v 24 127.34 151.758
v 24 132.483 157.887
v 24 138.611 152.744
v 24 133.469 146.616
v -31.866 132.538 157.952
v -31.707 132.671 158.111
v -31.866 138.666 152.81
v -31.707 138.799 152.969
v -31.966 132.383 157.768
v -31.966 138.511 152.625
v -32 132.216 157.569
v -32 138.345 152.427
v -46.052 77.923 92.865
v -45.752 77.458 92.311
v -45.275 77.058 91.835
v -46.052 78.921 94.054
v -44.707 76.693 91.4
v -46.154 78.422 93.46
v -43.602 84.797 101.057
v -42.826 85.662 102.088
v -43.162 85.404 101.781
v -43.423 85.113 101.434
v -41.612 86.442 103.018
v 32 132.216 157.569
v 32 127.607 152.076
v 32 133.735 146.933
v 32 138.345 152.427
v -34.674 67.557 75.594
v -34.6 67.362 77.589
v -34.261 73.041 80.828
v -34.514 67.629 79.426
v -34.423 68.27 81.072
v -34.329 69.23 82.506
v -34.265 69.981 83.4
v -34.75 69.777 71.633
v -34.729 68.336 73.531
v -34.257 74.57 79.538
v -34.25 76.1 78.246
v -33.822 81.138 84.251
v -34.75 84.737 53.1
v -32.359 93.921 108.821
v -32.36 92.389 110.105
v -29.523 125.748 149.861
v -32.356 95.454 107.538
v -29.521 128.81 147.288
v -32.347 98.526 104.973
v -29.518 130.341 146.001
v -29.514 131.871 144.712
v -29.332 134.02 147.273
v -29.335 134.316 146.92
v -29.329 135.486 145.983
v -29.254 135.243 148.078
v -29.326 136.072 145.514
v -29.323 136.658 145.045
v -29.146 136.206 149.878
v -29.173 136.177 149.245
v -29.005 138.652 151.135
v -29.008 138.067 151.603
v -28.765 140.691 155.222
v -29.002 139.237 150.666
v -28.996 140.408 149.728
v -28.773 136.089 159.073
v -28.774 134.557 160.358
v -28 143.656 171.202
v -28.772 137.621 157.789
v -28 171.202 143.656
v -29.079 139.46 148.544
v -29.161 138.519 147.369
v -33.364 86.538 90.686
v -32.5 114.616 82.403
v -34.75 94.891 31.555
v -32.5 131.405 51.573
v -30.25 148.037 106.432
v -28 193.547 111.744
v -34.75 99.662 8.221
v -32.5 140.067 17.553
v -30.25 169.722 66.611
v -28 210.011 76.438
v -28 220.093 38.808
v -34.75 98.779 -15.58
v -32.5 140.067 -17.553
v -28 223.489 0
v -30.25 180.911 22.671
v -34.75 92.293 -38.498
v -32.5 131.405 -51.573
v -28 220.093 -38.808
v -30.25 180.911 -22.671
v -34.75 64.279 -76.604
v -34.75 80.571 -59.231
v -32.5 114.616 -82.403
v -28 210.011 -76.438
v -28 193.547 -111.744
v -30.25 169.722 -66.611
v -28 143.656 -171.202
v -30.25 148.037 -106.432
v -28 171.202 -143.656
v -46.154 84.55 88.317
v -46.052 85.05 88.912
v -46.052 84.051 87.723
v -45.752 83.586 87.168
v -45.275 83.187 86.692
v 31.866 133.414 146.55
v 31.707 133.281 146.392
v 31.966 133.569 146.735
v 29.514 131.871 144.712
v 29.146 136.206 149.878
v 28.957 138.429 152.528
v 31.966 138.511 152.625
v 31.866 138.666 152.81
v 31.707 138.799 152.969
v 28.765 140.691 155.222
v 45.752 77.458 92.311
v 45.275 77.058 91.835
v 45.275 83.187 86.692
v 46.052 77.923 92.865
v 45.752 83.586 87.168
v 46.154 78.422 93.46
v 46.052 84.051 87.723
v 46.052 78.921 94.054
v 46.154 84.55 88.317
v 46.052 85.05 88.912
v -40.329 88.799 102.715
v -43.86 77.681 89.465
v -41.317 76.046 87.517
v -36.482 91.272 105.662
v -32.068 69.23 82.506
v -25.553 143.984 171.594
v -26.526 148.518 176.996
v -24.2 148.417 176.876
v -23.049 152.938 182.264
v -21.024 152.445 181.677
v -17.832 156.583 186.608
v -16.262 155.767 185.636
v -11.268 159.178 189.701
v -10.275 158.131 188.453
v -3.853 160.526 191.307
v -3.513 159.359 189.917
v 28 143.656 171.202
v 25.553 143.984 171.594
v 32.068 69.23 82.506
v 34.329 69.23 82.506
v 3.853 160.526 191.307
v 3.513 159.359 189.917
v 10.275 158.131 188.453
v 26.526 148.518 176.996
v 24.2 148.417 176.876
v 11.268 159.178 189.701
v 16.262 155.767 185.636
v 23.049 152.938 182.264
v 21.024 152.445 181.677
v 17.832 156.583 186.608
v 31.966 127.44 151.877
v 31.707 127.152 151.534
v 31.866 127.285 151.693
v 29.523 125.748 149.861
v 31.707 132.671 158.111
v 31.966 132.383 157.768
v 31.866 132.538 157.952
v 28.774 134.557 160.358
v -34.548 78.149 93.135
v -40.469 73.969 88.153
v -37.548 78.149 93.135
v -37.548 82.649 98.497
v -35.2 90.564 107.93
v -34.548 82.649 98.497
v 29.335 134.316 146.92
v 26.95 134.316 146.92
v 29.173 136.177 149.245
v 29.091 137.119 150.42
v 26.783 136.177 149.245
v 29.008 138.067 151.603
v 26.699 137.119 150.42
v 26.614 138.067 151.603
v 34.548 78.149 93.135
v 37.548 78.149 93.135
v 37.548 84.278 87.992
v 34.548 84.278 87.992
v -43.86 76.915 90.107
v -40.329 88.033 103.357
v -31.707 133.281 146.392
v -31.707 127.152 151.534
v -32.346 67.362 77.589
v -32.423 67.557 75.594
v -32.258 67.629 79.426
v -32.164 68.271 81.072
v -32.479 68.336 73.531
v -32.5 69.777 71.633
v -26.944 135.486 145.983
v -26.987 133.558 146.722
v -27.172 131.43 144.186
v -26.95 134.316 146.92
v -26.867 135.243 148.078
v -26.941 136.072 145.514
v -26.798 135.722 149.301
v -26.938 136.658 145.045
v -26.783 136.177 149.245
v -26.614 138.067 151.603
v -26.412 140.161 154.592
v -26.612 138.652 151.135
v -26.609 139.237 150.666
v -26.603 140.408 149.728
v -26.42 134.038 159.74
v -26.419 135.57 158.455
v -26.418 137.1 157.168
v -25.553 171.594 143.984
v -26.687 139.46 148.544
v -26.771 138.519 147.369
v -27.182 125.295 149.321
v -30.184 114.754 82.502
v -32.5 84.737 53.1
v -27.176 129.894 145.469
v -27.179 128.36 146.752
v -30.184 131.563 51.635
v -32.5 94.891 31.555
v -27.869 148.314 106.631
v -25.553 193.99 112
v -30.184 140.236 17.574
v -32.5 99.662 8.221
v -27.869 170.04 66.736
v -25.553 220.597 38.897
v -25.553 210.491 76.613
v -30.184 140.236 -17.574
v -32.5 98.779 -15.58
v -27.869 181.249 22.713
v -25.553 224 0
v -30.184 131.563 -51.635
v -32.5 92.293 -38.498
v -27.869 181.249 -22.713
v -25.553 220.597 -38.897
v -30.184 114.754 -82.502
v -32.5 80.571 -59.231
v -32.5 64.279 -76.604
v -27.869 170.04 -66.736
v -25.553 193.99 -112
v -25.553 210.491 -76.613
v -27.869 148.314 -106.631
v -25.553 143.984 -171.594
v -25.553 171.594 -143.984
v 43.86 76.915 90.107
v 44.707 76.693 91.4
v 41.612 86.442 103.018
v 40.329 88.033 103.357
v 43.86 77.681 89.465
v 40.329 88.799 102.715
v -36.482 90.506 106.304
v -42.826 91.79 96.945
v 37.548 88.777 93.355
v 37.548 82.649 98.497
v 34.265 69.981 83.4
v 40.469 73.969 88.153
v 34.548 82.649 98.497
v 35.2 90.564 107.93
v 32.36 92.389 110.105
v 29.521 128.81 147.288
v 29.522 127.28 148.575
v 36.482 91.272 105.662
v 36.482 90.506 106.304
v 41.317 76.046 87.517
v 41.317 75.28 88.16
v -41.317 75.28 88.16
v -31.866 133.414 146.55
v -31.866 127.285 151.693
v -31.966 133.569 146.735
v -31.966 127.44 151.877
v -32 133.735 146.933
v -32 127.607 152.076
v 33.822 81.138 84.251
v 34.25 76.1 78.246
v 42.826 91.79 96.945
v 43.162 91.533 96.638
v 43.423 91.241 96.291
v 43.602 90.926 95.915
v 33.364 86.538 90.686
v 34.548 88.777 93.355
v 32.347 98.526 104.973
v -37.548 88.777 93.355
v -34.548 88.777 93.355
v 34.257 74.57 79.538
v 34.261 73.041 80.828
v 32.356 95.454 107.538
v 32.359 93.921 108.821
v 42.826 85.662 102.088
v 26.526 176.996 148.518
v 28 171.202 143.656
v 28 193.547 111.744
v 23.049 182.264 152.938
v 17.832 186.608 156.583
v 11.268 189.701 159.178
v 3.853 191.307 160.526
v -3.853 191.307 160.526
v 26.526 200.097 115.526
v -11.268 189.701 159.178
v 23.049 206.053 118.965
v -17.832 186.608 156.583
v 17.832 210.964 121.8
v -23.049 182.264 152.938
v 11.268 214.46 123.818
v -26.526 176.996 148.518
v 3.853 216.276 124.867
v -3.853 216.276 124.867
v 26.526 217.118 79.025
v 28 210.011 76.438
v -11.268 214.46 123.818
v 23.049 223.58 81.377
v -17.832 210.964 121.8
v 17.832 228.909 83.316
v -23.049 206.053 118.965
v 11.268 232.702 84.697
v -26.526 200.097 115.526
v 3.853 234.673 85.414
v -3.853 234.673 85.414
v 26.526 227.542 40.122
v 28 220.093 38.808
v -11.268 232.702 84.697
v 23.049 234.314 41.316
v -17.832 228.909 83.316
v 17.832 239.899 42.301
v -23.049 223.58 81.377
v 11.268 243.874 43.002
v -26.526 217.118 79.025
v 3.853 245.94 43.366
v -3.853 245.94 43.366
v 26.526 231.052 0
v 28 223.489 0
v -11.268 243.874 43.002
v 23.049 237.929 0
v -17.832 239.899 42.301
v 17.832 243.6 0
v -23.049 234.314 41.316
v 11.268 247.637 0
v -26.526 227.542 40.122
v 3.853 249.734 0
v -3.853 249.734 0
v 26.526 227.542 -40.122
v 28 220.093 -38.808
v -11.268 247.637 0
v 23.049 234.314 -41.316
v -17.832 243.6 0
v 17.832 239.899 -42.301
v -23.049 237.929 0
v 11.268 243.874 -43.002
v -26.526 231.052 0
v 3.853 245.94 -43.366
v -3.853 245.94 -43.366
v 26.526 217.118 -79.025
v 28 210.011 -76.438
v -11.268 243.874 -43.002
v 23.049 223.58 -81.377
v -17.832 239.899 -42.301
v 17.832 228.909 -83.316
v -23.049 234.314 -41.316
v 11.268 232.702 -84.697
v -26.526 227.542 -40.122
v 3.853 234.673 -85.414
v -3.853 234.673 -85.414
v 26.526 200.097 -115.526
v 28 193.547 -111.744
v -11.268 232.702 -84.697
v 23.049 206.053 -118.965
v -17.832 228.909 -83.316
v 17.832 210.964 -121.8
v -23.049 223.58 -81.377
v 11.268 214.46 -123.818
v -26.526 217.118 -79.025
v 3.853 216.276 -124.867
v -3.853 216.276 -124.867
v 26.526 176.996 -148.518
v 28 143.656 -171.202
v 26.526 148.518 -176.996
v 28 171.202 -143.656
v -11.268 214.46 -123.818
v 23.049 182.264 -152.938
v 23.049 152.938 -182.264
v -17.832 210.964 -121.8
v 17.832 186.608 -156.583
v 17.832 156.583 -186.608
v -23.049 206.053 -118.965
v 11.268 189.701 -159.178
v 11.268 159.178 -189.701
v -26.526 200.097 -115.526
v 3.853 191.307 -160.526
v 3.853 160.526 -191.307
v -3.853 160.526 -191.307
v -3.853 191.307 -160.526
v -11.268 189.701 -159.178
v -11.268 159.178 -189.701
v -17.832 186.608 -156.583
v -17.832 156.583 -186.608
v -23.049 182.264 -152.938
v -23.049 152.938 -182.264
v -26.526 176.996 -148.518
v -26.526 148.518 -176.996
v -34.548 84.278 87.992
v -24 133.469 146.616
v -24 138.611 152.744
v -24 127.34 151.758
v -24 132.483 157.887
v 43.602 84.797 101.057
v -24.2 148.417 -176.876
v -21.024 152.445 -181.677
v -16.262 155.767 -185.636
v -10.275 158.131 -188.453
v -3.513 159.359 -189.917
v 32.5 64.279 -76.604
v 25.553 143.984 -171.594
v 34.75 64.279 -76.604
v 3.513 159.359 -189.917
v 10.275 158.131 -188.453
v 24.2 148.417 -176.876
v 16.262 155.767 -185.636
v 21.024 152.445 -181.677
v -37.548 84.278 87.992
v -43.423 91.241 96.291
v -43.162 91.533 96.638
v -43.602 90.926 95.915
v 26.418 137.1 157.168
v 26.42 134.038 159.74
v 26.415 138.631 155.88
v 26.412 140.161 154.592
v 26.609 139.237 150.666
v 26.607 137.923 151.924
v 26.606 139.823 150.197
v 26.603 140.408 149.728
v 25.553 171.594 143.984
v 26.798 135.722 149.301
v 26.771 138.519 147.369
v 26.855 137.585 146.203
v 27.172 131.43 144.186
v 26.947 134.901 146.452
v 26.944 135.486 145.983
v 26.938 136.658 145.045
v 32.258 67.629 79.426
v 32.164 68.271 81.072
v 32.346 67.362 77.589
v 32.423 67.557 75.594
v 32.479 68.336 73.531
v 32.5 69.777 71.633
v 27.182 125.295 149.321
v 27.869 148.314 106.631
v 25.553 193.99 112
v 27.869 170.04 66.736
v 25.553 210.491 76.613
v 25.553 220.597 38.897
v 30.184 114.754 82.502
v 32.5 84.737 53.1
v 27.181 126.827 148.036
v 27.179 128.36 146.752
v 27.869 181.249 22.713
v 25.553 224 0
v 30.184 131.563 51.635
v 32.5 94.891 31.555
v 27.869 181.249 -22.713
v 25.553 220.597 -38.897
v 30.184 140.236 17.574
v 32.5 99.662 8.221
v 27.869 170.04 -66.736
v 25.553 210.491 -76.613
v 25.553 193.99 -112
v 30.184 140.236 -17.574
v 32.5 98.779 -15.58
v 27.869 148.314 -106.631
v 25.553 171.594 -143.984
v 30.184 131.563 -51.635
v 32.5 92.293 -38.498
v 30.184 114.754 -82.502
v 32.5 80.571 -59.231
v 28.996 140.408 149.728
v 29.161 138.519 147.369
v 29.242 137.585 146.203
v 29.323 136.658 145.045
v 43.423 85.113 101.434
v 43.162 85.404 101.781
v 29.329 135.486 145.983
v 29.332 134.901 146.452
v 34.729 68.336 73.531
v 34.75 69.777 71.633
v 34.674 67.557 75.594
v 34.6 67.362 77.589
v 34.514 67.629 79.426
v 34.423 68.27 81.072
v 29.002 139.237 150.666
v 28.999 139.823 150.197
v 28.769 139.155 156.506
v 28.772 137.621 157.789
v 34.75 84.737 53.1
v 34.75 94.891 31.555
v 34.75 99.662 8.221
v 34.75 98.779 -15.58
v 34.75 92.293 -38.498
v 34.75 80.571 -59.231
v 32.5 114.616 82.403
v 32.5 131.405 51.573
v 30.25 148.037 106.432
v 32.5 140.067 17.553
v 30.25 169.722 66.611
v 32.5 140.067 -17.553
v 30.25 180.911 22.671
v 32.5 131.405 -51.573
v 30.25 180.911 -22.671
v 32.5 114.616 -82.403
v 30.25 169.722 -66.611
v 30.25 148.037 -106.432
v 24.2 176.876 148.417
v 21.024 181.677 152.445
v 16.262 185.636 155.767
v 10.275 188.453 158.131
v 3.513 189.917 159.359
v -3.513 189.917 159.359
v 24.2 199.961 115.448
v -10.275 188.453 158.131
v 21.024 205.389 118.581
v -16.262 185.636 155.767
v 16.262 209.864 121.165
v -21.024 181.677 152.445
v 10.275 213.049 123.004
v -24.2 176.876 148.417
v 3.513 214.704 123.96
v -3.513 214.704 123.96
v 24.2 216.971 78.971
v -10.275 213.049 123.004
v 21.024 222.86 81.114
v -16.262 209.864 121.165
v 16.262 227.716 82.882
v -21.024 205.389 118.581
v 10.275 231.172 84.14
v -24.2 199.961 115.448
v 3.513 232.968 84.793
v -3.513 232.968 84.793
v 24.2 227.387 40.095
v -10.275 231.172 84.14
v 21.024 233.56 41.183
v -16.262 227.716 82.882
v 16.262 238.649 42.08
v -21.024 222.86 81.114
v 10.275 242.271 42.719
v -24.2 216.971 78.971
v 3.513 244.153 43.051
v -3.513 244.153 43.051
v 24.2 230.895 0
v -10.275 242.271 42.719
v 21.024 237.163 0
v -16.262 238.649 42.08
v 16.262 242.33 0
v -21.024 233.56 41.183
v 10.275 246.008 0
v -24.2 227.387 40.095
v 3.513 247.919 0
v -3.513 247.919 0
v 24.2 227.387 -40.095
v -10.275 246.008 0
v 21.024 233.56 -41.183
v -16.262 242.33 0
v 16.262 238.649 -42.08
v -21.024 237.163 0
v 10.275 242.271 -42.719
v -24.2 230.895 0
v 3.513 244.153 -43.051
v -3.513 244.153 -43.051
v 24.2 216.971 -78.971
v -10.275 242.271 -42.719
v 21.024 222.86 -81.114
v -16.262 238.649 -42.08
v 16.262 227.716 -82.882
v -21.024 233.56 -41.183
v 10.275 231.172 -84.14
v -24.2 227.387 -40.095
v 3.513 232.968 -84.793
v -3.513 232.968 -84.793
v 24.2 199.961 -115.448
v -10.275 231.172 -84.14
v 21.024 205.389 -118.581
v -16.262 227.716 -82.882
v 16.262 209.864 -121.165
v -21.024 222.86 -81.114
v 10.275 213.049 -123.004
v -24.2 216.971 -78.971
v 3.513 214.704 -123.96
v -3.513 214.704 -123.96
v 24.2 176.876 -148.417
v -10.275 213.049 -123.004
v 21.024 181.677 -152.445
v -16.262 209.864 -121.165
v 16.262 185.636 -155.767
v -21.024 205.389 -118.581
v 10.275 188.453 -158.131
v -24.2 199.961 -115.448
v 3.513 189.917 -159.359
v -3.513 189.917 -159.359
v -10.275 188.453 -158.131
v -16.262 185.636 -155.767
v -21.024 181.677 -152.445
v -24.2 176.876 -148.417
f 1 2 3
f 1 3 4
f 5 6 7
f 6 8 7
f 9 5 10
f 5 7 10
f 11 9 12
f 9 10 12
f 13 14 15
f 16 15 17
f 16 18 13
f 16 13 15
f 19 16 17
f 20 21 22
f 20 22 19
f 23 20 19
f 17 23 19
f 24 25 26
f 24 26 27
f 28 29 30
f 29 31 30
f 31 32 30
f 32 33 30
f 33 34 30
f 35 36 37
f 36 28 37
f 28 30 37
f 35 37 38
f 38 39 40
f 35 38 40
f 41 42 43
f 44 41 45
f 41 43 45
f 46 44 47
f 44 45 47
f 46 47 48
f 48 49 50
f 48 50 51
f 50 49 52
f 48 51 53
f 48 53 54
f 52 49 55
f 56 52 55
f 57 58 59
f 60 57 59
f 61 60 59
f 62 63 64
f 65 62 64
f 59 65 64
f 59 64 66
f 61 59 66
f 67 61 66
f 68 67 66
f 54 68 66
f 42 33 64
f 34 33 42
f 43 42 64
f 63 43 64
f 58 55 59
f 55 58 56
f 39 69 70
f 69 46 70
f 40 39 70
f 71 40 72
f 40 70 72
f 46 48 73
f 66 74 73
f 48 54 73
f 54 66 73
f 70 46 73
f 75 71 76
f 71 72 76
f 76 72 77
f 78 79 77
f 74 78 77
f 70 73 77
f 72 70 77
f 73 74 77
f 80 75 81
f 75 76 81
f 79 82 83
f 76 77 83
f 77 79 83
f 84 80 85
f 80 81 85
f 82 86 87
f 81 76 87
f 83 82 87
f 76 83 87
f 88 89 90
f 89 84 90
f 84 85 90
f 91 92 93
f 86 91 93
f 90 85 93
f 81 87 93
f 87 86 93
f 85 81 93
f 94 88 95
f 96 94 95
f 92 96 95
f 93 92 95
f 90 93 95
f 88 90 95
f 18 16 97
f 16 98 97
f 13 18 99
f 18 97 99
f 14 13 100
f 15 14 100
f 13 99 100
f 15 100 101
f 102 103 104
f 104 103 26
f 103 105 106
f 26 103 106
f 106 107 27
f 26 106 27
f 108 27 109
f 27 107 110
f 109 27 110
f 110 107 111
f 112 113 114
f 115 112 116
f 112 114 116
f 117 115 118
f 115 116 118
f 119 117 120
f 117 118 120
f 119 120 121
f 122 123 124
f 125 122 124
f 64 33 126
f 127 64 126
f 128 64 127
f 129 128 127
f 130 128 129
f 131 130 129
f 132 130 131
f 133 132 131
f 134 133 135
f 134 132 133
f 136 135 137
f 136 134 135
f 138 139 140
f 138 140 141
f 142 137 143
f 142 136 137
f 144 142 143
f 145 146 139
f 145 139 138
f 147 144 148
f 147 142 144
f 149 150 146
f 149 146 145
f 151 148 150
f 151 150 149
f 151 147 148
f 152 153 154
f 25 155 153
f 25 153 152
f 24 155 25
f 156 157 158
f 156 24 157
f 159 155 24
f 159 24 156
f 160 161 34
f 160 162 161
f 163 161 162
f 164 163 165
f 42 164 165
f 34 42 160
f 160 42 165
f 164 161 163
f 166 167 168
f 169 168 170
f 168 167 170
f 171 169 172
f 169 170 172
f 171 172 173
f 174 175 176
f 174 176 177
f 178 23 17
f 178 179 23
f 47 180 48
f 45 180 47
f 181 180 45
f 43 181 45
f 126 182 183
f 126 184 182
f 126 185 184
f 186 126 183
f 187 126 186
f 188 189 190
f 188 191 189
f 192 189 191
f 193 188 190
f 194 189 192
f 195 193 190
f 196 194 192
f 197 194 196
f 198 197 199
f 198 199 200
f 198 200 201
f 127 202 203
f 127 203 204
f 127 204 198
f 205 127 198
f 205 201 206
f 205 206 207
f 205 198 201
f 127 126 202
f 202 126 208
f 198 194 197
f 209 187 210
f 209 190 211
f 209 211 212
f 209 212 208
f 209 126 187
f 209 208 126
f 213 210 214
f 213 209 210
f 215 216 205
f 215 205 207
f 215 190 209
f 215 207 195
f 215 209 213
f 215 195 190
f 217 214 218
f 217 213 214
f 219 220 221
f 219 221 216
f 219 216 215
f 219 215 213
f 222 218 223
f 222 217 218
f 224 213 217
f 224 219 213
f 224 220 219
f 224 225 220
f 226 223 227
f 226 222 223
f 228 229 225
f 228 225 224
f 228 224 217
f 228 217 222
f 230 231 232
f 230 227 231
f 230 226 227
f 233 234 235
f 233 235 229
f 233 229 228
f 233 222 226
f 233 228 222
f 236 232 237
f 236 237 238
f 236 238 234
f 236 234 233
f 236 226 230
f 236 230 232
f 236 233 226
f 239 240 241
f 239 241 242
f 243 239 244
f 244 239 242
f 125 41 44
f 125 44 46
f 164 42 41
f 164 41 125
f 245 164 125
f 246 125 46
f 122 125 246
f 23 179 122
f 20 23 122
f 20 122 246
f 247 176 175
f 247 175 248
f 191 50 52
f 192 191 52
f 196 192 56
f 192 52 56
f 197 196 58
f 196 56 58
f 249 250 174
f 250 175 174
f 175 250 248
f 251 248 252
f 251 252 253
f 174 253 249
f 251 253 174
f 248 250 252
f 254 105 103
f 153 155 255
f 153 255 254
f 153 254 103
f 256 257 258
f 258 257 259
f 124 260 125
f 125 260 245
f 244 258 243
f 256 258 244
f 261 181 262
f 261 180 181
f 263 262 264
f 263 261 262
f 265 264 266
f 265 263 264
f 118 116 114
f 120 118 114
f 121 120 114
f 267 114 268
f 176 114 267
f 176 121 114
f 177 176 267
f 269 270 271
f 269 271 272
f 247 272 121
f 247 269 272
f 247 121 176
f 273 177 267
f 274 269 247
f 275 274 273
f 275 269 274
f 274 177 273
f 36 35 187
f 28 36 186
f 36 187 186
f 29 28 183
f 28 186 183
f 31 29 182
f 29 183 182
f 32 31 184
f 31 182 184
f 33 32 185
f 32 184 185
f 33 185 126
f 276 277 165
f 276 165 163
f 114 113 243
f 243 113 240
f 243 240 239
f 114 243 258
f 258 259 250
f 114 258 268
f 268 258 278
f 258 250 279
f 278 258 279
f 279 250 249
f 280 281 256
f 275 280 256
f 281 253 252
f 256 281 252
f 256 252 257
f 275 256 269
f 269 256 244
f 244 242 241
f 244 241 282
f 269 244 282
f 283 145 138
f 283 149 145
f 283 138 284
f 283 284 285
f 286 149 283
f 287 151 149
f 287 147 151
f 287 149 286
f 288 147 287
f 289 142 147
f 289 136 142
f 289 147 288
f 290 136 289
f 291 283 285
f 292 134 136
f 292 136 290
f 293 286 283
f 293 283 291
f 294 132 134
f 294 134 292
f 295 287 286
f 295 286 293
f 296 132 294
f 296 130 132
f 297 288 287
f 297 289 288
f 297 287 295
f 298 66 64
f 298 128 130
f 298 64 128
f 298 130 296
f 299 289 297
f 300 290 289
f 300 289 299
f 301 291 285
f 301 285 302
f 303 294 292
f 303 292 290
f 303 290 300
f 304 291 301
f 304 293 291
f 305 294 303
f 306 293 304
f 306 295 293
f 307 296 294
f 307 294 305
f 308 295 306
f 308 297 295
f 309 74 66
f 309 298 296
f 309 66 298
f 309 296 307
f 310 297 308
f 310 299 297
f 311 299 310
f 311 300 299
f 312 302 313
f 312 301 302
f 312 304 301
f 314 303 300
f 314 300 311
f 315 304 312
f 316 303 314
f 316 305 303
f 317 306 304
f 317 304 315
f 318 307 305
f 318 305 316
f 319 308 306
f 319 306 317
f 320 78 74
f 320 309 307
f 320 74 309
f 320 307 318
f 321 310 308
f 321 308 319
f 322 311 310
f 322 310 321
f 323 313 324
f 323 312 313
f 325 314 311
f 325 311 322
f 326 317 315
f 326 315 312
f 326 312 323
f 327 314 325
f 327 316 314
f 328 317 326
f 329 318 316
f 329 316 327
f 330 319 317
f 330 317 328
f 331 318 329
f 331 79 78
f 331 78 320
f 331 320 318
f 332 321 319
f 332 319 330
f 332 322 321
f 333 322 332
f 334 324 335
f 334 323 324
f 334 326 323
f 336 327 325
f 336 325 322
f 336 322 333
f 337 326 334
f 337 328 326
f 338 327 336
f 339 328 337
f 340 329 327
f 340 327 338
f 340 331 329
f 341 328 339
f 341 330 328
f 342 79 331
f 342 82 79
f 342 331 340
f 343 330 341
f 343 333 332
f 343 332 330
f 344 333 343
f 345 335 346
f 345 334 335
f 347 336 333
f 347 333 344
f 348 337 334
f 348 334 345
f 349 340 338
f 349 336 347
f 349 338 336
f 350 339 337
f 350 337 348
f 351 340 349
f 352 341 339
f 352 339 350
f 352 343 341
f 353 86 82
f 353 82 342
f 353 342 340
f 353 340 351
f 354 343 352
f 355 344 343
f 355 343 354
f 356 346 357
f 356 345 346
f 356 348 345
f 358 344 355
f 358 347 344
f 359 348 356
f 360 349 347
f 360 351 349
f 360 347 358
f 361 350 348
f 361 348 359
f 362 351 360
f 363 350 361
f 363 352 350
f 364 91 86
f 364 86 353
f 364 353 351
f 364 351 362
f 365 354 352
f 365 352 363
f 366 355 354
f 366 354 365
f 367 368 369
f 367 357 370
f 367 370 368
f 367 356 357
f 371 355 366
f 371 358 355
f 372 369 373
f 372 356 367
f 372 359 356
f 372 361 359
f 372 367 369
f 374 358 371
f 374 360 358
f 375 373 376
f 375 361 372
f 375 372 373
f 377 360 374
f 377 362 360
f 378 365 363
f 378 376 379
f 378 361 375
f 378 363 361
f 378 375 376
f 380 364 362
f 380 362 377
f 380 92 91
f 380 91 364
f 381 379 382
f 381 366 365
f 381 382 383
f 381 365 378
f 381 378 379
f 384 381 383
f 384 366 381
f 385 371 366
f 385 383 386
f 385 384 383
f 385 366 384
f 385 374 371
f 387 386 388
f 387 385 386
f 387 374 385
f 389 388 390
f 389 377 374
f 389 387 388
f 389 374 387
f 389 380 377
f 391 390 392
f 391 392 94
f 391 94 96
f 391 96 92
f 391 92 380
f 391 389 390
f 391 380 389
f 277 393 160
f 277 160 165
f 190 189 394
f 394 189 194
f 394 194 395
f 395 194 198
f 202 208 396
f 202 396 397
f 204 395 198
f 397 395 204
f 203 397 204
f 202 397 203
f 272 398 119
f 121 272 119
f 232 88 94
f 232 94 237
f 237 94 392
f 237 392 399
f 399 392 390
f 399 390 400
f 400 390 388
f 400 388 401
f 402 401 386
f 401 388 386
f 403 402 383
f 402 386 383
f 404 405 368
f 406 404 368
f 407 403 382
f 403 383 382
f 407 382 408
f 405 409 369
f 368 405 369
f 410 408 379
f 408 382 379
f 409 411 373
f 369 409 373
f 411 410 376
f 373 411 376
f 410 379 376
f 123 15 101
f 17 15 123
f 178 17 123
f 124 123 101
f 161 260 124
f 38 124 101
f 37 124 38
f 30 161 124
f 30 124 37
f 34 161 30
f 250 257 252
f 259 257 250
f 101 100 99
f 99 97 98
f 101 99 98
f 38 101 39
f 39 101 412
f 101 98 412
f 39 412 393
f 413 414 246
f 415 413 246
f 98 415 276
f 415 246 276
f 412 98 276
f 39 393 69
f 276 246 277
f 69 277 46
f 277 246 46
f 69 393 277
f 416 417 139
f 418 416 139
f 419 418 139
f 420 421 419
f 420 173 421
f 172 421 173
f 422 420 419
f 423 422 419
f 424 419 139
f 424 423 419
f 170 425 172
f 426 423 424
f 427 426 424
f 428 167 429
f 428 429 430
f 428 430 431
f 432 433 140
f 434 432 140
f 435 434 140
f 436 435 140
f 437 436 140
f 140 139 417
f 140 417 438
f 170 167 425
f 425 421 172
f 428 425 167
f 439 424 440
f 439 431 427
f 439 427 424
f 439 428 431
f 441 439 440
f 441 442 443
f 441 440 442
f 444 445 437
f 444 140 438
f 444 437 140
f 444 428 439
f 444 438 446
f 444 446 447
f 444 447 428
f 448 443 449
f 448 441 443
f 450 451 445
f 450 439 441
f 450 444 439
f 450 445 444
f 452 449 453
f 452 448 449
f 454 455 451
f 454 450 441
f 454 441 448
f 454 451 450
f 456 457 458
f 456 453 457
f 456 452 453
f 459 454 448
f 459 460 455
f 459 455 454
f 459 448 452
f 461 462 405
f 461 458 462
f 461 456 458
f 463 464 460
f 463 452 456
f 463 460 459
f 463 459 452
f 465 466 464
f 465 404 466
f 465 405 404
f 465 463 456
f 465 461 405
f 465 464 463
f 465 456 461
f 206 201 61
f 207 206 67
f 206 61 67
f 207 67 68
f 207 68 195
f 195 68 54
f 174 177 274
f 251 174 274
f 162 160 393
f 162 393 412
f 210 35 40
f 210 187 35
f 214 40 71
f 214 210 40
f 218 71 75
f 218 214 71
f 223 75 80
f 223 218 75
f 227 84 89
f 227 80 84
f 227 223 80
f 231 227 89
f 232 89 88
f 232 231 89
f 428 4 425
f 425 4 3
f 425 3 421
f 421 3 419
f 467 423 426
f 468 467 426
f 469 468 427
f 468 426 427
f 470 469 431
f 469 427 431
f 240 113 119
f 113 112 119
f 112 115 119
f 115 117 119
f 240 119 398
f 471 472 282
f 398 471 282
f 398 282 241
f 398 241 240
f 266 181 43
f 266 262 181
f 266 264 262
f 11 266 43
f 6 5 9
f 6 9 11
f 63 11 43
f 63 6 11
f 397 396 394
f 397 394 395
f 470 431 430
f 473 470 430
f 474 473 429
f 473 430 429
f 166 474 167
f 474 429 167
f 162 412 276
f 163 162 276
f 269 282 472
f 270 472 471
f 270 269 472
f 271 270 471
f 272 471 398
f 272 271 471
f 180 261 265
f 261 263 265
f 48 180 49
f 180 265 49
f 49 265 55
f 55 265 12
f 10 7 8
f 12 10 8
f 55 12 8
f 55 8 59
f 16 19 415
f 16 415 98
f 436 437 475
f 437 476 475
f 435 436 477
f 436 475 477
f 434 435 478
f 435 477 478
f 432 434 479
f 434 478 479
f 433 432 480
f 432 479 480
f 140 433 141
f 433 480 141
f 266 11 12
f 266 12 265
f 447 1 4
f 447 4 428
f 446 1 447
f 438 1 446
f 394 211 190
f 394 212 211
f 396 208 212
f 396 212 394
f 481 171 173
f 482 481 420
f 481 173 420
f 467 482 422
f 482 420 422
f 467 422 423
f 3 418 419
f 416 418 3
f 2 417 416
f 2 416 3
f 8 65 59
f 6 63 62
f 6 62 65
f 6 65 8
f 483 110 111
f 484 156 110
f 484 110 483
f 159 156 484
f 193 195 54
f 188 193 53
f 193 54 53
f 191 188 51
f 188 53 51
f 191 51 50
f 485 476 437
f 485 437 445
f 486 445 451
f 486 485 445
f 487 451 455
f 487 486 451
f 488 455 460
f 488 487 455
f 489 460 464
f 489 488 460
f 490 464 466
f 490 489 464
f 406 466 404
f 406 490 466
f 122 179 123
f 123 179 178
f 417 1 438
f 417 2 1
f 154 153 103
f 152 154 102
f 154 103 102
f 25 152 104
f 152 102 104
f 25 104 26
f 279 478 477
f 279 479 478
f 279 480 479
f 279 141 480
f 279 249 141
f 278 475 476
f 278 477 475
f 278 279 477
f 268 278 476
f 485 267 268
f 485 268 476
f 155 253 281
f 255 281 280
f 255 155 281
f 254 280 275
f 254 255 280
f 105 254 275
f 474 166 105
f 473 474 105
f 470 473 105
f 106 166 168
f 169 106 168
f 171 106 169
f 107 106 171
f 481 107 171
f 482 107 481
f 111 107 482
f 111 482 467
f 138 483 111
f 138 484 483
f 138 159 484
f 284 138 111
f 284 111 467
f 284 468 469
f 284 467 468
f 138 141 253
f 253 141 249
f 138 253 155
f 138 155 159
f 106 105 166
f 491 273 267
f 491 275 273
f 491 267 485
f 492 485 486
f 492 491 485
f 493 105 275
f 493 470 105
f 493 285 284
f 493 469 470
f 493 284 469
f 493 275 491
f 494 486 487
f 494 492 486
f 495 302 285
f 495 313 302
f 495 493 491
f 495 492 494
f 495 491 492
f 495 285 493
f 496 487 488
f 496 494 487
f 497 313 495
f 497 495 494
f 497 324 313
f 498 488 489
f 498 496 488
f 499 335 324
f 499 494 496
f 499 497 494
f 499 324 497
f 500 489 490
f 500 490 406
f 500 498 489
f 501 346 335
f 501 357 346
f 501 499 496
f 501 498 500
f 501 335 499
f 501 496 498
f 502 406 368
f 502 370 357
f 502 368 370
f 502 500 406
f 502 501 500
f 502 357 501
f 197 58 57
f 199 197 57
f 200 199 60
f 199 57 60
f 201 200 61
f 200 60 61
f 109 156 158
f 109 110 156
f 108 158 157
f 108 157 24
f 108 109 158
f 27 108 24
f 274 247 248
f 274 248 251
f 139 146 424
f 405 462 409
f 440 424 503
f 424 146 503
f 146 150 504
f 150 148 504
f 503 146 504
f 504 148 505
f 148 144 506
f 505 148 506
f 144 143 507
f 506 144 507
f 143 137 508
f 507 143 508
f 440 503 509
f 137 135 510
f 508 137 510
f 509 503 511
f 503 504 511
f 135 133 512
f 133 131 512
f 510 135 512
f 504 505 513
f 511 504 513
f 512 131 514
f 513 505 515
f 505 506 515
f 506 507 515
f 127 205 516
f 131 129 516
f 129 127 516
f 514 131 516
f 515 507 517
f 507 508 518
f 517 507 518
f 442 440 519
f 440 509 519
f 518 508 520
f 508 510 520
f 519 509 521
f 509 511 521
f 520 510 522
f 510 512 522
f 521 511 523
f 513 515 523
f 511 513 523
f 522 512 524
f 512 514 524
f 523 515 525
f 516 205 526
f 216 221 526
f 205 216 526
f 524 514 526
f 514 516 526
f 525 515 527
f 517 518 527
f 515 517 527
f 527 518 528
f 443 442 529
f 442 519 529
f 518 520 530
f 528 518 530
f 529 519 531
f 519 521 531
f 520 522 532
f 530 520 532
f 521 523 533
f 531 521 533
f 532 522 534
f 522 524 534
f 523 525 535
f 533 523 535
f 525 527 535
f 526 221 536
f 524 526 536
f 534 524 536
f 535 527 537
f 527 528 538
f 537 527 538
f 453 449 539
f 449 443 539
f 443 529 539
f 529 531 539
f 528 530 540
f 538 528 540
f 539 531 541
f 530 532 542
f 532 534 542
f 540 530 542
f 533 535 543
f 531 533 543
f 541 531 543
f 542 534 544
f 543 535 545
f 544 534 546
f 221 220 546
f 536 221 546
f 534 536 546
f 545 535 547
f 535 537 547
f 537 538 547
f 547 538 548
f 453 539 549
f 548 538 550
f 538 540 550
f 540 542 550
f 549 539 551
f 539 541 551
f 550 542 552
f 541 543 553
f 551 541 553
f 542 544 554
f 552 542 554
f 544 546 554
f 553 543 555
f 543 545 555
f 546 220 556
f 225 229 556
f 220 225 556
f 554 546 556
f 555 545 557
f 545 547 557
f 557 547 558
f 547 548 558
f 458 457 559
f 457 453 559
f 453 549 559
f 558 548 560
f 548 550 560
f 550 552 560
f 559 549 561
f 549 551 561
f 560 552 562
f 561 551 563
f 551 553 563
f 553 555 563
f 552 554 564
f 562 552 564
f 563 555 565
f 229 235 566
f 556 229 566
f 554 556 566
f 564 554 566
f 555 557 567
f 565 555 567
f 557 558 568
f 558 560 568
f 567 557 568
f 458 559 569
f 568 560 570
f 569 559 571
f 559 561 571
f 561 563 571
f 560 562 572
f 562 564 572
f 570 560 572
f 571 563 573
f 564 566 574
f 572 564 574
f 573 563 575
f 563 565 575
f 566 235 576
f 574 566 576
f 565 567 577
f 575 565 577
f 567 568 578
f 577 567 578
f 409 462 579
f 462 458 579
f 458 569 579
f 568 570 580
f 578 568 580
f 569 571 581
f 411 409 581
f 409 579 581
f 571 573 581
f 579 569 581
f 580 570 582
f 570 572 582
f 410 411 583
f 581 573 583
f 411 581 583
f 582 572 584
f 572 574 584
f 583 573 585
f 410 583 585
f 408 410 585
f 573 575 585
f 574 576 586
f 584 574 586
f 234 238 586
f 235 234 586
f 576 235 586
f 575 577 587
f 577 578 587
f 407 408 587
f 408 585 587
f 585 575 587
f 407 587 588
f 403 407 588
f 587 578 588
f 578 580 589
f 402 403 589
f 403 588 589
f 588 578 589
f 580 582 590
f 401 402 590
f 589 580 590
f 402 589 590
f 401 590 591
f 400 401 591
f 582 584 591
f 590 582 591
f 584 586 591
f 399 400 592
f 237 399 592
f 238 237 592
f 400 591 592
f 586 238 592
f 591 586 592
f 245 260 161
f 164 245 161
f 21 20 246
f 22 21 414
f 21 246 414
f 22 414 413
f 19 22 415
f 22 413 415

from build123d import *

# Parameters (mm, degrees)
REVOLUTION_ANGLE = 100
FILLET_R         = 8
PAD_DEPTH        = 8
POCKET_DEPTH     = 2
CHAMFER_SIZE     = 1
SKETCH005_W      = 3
SKETCH005_H      = 7
POCKET001_DEPTH  = 81.861582
POCKET002_DEPTH  = 78.501
FILLET001_R      = 3
FILLET002_R      = 1


with BuildPart() as part:
    # Sketch → Revolution (revolve, symmetric)
    with BuildSketch(Plane.XY) as revolution_sk:
        with BuildLine():
            ThreePointArc((28, 223.488706), (0, 250), (-28, 223.488706))
            Line((-34.75, 100), (-28, 223.488706))
            Line((-34.75, 100), (-32.5, 100))
            Line((-32.5, 100), (-25.552843, 224))
            ThreePointArc((25.552843, 224), (0, 248.161305), (-25.552843, 224))
            Line((25.552843, 224), (32.5, 100))
            Line((32.5, 100), (34.75, 100))
            Line((34.75, 100), (28, 223.488706))
        make_face()
    revolve(axis=Axis((0, 0, 0), (1, 0, 0)), revolution_arc=REVOLUTION_ANGLE / 2)
    revolve(revolution_sk.sketch, axis=Axis((0, 0, 0), (-1, 0, 0)), revolution_arc=REVOLUTION_ANGLE / 2)

    # Fillet
    fillet_edges = [part.edges().sort_by_distance(p)[0] for p in [
        (33.625, 64.278761, 76.604444),
        (-33.625, 64.278761, 76.604444),
    ]]
    fillet(fillet_edges, radius=FILLET_R)

    # Sketch002 (on Face5 of Fillet) → Pad (new body)
    with BuildSketch(Plane(origin=(0, 0, 0), x_dir=(1, 0, 0), z_dir=(0, -0.766044, 0.642788))):
        Polygon((-43.394171, 132.697505), (-46.5, 121.106395), (-33.248819, 107.855214), (-31, 145.091677), align=None)
        Polygon((43.394171, 132.697505), (46.5, 121.106395), (33.248819, 107.855214), (31, 145.091677), align=None)
        Polygon((28, 194.106395), (32, 198.106395), (32, 206.106395), (28, 210.106395), (24, 206.106395), (24, 198.106395), align=None)
        Polygon((-28, 194.106395), (-24, 198.106395), (-24, 206.106395), (-28, 210.106395), (-32, 206.106395), (-32, 198.106395), align=None)
    extrude(amount=-PAD_DEPTH)

    # Sketch003 (on Face47 of Pad) → Pocket (cut)
    with BuildSketch(Plane(origin=(0, 0, 0), x_dir=(1, 0, 0), z_dir=(0, -0.766044, 0.642788))):
        Polygon((35, 146.869795), (45, 97.88), (47.939388, 98.48), (37.939388, 147.469795), align=None)
        Polygon((-47.939388, 98.48), (-45, 97.88), (-35, 146.869795), (-37.939388, 147.469795), align=None)
    extrude(amount=-POCKET_DEPTH, mode=Mode.SUBTRACT)

    # Chamfer
    chamfer_edges = [part.edges().sort_by_distance(p)[0] for p in [
        (42.094426, 81.707526, 97.375238),
        (38.89944, 82.126736, 97.874832),
        (-38.89944, 82.126736, 97.874832),
        (-42.094426, 81.707526, 97.375238),
    ]]
    chamfer(chamfer_edges, length=CHAMFER_SIZE)

    # Sketch005 (on Face6 of Chamfer) → Pocket001 (cut, through all)
    with BuildSketch(Plane(origin=(0, 6.128356, -5.142301), x_dir=(-1, 0, 0), z_dir=(0, 0.766044, -0.642788))):
        with Locations((-36.047712, 125.078524)):
            Rectangle(SKETCH005_W, SKETCH005_H)
        with Locations((36.047712, 125.078524)):
            Rectangle(SKETCH005_W, SKETCH005_H)
    extrude(amount=-POCKET001_DEPTH, mode=Mode.SUBTRACT)

    # Sketch006 (on Face54 of Pocket001) → Pocket002 (cut, through all)
    with BuildSketch(Plane(origin=(-32, 0, 0), x_dir=(0, -1, 0), z_dir=(-1, 0, 0))):
        Polygon((-140.408225, 149.728159), (-136.657552, 145.044949), (-134.315947, 146.920285), (-138.06662, 151.603495), align=None)
    extrude(amount=-POCKET002_DEPTH, mode=Mode.SUBTRACT)

    # Fillet001
    fillet001_edges = [part.edges().sort_by_distance(p)[0] for p in [
        (46.5, 80.909868, 90.201731),
        (43.394171, 88.36049, 99.081036),
        (-43.394171, 88.36049, 99.081036),
        (-46.5, 80.909868, 90.201731),
    ]]
    fillet(fillet001_edges, radius=FILLET001_R)

    # Fillet002
    fillet002_edges = [part.edges().sort_by_distance(p)[0] for p in [
        (32, 135.546815, 155.315508),
        (32, 130.404514, 149.187153),
        (-32, 130.404514, 149.187153),
        (-32, 135.546815, 155.315508),
    ]]
    fillet(fillet002_edges, radius=FILLET002_R)


solid = part.part
